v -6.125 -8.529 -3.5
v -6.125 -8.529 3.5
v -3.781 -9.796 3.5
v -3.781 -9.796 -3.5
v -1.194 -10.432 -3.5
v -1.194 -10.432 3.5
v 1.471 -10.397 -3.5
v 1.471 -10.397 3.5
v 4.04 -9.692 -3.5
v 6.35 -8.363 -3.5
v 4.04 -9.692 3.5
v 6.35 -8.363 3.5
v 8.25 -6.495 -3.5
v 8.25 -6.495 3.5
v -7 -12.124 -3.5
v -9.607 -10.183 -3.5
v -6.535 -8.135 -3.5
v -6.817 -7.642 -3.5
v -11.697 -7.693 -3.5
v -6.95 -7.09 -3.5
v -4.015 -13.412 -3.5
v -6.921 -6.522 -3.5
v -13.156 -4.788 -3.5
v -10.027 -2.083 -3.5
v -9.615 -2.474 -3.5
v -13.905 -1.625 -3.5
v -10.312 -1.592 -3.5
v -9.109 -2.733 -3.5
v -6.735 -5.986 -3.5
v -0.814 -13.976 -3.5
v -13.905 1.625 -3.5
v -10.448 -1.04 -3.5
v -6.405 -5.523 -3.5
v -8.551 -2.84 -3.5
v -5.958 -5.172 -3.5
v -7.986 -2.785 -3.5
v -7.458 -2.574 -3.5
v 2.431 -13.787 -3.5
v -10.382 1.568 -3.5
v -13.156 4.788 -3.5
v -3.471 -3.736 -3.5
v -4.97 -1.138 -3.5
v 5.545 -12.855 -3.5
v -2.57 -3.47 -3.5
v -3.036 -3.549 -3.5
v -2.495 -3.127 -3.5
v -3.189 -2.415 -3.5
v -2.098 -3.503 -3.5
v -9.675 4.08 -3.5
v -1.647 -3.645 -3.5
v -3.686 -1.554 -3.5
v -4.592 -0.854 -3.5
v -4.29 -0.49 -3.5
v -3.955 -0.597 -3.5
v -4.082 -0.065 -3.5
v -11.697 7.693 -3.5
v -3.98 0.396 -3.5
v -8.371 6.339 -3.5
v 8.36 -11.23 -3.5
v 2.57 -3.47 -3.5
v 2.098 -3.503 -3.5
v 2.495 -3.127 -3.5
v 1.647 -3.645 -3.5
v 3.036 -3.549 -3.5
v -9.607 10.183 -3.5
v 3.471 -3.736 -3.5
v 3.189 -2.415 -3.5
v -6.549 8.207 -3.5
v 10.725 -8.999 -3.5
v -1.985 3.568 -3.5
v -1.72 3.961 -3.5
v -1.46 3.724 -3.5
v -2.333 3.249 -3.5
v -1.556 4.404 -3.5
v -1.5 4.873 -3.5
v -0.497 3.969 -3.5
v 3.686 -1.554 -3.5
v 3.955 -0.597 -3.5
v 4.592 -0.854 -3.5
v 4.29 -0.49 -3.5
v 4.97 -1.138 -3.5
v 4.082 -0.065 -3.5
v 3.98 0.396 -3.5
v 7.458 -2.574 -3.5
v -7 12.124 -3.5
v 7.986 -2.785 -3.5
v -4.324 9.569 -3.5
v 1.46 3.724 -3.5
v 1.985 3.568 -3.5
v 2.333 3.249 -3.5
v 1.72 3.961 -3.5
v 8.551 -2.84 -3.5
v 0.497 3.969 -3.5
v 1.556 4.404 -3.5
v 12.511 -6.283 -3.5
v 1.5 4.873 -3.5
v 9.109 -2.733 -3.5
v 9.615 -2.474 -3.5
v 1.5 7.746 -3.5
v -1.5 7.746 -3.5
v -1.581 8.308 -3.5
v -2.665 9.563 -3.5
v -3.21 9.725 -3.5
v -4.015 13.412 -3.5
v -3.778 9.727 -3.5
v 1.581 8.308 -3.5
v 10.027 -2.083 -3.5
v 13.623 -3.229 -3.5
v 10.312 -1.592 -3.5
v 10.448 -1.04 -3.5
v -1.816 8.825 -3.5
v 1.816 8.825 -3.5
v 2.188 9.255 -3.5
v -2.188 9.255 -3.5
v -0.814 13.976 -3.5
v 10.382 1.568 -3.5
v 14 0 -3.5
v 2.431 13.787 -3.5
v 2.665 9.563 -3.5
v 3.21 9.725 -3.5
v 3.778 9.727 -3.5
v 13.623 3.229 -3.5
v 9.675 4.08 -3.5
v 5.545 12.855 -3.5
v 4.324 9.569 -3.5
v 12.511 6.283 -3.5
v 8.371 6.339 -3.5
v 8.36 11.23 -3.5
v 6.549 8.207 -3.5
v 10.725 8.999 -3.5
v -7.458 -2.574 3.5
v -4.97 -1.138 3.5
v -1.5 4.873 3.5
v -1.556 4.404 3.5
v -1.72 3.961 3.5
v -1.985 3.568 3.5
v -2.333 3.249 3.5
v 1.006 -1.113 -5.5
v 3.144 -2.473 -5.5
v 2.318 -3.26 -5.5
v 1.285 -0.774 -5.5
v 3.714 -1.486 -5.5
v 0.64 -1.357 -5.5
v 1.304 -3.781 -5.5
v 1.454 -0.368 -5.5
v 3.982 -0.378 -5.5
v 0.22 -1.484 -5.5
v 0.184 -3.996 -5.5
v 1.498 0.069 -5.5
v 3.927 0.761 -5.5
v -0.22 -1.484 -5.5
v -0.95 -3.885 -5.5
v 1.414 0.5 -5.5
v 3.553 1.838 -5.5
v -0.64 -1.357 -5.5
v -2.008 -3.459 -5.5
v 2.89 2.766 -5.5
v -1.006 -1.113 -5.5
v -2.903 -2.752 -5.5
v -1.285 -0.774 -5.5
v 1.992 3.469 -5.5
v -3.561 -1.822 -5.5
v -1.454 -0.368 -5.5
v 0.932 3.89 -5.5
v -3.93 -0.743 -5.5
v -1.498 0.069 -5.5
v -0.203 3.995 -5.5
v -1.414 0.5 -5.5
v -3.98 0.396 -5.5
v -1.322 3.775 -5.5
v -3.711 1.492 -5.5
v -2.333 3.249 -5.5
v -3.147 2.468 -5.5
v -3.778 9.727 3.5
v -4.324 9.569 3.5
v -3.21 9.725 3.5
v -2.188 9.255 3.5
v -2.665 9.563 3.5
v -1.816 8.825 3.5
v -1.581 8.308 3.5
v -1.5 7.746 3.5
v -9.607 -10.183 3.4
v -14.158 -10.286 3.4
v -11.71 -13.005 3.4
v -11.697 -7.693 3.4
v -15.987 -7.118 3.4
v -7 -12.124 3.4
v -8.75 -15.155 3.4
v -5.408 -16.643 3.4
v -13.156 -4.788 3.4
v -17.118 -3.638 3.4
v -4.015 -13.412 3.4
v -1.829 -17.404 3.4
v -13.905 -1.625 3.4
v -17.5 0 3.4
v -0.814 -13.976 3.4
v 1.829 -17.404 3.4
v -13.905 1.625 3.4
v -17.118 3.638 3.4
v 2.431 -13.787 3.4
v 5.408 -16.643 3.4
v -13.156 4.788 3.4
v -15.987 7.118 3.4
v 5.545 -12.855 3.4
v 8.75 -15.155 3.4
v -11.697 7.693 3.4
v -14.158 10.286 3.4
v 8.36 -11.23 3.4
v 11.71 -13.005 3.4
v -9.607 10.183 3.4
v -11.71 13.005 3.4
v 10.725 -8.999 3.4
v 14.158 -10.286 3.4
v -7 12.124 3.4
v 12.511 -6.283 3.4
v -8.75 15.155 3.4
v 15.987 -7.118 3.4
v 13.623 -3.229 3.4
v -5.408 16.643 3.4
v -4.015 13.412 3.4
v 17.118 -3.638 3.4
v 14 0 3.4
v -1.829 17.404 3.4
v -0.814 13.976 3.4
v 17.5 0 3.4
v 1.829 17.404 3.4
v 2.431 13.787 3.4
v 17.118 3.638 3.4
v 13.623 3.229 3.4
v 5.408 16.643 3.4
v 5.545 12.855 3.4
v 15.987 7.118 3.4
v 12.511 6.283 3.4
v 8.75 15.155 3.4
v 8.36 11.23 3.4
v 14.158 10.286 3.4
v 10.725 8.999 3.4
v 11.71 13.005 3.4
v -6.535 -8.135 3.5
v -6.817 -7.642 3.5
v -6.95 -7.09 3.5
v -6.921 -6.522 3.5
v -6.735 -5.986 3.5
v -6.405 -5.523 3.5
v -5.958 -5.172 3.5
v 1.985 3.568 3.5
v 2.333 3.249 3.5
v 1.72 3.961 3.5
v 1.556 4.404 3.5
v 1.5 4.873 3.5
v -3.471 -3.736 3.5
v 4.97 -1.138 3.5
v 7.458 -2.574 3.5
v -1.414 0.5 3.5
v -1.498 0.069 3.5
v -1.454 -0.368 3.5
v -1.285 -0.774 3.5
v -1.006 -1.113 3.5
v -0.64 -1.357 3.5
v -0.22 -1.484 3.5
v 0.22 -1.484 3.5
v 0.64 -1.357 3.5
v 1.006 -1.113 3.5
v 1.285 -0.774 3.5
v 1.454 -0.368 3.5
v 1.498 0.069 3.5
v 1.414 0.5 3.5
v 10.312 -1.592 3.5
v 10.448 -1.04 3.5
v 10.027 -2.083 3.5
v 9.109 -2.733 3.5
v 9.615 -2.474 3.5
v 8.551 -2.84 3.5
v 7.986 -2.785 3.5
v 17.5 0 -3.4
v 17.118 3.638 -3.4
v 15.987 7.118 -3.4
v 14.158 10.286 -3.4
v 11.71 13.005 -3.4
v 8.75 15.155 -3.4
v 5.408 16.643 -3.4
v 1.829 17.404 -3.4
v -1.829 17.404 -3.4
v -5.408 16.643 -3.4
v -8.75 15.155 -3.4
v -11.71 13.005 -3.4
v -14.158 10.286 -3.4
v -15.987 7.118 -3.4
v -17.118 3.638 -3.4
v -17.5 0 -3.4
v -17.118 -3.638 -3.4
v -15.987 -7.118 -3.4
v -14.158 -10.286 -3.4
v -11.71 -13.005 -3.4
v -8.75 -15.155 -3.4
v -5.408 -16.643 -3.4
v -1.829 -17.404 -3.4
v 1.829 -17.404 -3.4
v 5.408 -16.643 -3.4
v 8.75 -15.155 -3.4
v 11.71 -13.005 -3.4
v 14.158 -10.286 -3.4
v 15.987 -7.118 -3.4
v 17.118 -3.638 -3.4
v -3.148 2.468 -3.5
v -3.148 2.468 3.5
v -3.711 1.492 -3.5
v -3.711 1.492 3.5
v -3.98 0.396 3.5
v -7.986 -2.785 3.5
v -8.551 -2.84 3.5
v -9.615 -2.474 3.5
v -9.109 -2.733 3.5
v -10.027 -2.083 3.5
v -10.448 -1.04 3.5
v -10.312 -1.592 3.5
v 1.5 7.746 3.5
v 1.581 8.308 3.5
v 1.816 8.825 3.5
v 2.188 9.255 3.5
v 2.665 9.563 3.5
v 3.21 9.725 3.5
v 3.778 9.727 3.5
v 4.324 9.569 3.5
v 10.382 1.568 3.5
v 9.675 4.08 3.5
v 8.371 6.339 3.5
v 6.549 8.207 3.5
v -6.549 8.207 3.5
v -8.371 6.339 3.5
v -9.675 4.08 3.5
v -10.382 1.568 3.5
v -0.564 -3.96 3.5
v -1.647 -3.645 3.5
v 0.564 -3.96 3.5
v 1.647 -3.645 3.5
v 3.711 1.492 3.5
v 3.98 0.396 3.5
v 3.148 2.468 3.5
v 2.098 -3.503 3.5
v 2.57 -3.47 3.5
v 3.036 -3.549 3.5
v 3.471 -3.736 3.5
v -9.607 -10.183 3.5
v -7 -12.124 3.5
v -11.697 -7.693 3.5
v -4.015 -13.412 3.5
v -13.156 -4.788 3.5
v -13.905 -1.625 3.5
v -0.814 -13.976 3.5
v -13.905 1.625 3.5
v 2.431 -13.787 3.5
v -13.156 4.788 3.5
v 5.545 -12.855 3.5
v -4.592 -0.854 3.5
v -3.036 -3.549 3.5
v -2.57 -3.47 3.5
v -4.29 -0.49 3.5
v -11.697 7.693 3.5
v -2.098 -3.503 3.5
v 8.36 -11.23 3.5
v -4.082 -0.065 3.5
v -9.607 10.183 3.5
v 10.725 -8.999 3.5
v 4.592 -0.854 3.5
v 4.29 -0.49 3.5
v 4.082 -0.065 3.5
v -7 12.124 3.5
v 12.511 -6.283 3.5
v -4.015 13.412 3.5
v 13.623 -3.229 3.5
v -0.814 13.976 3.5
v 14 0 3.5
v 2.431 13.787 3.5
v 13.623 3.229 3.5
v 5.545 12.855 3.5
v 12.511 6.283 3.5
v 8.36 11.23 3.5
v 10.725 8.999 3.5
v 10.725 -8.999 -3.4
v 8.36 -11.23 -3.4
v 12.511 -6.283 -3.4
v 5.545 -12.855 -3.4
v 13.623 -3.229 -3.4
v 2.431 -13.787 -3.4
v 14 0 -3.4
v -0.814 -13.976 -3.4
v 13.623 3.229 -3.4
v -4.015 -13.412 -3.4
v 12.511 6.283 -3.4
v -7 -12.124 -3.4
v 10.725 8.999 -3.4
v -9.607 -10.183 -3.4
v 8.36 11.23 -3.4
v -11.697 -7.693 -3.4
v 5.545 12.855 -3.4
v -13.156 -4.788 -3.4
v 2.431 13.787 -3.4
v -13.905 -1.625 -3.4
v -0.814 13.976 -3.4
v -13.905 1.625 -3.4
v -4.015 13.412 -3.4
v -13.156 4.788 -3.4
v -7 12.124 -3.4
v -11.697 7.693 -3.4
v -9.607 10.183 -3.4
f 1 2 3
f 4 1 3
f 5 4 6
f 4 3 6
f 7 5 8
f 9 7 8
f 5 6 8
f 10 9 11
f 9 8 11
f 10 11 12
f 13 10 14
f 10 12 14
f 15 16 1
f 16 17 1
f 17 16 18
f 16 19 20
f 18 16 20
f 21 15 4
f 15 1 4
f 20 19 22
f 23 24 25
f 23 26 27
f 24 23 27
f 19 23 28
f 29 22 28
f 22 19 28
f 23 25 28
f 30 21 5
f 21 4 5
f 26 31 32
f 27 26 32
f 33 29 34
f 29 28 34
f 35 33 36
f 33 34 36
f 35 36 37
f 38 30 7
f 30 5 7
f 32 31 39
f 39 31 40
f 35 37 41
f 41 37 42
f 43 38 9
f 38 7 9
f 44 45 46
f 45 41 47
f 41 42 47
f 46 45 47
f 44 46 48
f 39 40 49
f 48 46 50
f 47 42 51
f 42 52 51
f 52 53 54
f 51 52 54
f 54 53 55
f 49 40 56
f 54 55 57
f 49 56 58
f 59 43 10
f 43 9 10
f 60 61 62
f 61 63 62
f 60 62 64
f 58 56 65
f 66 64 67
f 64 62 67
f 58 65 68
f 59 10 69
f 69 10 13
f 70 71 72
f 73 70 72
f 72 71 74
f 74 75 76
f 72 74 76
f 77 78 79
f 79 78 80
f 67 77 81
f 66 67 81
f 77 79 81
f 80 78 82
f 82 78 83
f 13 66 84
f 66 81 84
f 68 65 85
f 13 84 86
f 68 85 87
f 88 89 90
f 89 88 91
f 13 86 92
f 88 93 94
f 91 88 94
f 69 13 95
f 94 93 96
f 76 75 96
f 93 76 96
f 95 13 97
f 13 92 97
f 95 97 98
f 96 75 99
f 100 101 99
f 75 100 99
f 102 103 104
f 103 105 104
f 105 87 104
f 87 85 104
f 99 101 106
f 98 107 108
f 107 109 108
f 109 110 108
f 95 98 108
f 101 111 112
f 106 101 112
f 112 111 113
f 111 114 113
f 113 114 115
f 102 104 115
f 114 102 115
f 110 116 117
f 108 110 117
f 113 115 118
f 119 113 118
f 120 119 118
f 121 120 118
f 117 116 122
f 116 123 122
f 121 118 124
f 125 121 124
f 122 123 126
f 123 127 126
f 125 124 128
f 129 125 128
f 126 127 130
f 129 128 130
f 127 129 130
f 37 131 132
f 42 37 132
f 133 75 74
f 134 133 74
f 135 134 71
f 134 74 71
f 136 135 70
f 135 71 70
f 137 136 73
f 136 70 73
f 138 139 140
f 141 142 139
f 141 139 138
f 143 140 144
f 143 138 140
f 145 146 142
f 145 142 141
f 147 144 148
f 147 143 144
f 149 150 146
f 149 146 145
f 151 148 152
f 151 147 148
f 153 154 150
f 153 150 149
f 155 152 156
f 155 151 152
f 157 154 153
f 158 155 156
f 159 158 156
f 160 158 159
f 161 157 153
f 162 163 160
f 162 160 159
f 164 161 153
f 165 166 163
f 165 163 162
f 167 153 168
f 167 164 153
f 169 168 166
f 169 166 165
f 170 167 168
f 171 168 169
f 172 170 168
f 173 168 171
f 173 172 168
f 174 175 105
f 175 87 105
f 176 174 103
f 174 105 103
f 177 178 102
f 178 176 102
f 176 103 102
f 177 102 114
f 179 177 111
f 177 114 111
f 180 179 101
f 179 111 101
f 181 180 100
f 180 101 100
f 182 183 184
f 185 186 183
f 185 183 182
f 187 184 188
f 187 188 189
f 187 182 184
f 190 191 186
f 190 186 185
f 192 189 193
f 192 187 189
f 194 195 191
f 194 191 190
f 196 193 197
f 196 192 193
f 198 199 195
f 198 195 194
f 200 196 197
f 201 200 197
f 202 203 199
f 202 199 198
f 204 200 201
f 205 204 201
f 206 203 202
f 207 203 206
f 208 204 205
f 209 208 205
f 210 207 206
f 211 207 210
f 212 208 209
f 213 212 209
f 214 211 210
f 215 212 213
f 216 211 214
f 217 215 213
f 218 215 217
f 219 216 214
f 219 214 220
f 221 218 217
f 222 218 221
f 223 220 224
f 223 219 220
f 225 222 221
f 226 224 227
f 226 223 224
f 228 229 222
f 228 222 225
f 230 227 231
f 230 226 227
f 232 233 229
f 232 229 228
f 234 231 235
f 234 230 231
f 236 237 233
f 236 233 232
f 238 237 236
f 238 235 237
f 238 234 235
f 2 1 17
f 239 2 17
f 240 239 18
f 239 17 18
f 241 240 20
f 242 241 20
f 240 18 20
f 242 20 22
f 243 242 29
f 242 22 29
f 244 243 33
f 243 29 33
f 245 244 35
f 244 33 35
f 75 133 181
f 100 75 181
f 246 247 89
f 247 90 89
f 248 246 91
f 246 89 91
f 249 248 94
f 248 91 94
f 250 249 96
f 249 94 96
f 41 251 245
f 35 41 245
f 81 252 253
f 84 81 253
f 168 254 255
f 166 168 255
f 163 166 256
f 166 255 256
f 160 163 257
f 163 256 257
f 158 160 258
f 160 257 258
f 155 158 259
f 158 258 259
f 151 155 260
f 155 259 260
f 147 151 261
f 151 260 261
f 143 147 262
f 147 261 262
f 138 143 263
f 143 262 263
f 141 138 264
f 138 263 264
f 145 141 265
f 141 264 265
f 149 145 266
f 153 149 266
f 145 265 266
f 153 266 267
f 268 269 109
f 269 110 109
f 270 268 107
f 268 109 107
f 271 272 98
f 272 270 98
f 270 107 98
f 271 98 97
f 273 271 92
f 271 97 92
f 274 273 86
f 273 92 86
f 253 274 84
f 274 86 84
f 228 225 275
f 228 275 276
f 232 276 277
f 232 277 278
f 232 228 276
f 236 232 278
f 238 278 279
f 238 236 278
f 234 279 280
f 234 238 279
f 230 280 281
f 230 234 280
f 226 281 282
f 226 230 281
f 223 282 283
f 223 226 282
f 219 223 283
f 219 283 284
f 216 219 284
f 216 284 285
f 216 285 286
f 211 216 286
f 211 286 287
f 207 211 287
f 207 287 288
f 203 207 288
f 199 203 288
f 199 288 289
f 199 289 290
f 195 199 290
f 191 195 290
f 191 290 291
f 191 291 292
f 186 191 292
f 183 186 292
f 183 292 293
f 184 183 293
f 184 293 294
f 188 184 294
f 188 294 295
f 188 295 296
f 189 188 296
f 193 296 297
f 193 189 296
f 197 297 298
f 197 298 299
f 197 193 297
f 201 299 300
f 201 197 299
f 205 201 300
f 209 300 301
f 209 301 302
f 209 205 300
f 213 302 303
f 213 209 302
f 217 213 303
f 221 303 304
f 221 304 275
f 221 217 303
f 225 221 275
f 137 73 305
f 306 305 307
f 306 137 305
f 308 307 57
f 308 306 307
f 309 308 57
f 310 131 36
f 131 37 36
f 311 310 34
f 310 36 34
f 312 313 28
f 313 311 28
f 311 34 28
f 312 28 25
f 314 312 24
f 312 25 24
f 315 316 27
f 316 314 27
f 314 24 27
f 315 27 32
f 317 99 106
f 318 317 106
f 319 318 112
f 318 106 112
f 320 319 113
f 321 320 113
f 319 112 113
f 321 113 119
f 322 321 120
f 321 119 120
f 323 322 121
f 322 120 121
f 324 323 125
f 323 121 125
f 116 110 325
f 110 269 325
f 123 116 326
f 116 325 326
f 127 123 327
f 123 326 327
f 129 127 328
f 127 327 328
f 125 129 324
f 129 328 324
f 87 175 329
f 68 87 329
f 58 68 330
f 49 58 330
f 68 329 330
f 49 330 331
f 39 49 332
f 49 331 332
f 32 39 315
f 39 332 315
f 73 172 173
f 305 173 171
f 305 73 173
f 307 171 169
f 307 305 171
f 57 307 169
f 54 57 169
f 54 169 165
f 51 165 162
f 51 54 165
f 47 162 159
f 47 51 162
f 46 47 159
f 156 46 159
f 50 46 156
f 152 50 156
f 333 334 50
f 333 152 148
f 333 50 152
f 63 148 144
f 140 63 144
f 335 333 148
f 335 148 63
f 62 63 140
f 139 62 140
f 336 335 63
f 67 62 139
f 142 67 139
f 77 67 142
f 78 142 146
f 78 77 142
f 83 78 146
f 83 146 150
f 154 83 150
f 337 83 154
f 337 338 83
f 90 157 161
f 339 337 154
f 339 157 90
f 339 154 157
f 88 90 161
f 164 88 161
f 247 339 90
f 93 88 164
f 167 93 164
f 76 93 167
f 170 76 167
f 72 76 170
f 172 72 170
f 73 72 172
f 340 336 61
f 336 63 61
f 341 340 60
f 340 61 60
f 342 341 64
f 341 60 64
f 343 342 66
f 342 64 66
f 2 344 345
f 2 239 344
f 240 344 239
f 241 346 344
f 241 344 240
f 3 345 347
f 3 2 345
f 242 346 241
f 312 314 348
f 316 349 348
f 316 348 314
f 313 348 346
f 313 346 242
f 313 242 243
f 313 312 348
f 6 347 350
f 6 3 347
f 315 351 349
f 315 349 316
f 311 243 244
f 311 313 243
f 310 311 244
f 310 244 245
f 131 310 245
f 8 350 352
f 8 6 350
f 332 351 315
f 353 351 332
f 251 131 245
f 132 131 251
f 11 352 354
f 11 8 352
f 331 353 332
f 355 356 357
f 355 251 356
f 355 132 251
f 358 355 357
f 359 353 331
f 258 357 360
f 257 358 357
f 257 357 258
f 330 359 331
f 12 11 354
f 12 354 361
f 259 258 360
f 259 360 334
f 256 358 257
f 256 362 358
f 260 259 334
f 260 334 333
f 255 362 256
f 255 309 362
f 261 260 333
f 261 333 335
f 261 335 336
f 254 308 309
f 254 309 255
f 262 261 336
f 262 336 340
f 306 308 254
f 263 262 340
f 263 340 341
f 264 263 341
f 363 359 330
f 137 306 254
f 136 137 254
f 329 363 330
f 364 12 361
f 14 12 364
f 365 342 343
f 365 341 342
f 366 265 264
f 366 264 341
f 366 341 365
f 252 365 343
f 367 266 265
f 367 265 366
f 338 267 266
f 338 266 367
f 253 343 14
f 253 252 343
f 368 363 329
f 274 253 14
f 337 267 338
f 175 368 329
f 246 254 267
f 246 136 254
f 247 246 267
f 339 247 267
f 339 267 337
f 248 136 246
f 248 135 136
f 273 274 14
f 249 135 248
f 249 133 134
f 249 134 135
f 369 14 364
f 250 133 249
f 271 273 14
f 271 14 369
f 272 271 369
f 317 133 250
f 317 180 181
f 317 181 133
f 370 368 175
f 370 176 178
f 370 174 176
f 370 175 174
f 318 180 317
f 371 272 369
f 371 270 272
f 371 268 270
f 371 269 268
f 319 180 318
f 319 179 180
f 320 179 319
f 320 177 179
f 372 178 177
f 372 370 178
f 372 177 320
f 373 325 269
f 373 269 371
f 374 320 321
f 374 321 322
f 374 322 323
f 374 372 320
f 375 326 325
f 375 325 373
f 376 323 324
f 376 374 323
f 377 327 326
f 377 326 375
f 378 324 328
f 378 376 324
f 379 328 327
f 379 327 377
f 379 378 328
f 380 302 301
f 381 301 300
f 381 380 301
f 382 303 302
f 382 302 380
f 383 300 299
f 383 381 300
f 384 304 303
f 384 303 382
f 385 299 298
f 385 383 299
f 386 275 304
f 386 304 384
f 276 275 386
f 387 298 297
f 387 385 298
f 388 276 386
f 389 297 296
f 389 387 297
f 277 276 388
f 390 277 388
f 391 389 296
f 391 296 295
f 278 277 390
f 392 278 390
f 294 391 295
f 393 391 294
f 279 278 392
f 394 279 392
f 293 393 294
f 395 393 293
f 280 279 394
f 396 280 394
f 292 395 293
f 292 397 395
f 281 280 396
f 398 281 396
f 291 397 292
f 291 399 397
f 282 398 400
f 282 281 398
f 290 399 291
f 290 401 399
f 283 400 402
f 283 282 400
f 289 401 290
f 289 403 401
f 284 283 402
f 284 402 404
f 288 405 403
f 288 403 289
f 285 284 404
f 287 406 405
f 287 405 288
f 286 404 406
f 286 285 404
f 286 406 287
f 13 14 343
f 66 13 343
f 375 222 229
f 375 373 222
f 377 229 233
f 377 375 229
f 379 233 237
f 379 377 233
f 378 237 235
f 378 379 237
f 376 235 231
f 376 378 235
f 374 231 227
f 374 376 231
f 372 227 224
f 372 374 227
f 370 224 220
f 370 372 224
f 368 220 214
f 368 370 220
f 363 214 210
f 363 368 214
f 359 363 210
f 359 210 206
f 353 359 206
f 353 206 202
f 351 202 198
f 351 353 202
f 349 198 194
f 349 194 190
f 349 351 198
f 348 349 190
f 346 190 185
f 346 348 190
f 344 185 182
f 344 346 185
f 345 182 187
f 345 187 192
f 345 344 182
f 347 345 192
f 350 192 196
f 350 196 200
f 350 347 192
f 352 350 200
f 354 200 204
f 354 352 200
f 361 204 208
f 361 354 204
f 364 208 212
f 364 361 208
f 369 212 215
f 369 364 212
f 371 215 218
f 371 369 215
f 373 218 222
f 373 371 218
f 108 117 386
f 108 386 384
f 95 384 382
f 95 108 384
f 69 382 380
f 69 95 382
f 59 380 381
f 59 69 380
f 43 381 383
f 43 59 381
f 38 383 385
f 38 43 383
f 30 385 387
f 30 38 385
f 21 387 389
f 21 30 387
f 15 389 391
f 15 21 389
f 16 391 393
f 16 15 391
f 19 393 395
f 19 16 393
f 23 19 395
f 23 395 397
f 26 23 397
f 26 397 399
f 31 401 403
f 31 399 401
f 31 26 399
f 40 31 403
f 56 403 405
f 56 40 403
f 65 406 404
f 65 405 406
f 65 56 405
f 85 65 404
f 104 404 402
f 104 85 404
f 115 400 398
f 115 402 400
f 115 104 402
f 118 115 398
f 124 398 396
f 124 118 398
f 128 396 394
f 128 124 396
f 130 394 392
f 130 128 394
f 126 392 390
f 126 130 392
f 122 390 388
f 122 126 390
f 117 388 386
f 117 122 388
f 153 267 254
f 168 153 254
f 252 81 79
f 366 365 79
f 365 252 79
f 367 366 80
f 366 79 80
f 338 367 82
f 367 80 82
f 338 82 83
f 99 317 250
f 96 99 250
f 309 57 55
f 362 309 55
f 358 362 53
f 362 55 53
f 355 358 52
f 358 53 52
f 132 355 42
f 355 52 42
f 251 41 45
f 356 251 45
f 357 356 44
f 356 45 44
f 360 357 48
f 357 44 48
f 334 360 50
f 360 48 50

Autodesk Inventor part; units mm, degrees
ref_plane "YZ Plane" through (0, 0, 0) normal (1, 0, 0) x (0, 1, 0)
ref_plane "XZ Plane" through (0, 0, 0) normal (0, 1, 0) x (-1, 0, 0)
ref_plane "XY Plane" through (0, 0, 0) normal (0, 0, 1) x (1, 0, 0)
sketch "Sketch1" plane through (0, 0, 0) normal (0, 0, 1) x (1, 0, 0)
  circle A0 centre (0, 0) radius 17.5
  dimension "d0" = 35
extrude "Extrusion1" add sketch "Sketch1" along normal mid plane 7
sketch "Sketch2" plane through (0, 0, 3.5) normal (0, 0, 1) x (1, 0, 0)
  circle A0 centre (0, 0) radius 10.5
  circle A1 centre (0, 0) radius 4
  line L0 (1.5, 0) -> (-1.5, 0)
  line L1 (-1.5, 0) -> (-1.5, 10.5)
  line L2 (-1.5, 10.5) -> (1.5, 10.5)
  line L3 (1.5, 10.5) -> (1.5, 0)
  line L4 (0.75, -1.299) -> (-8.3433, -6.549)
  line L5 (-9.8433, -3.951) -> (-0.75, 1.299)
  line L6 (0.75, 1.299) -> (9.8433, -3.951)
  line L7 (8.3433, -6.549) -> (-0.75, -1.299)
  point P0 (0, 10.5)
  point P1 (8.25, -6.4952)
  point P2 (2.4613, -3.1531)
  point P3 (-2.4613, -3.1531)
  point P4 (-8.25, -6.4952)
  point P5 (3.9613, -0.555)
  point P6 (9.75, -3.8971)
  point P7 (1.5, 10.3923)
  point P8 (1.5, 3.7081)
  point P9 (-9.75, -3.8971)
  point P10 (-3.9613, -0.555)
  point P11 (-1.5, 3.7081)
  point P12 (-1.5, 10.3923)
  dimension "d3" = 21
  dimension "d4" = 8
  dimension "d5" = 3
  dimension "d8" = 360
extrude "Extrusion2" cut sketch "Sketch2" against normal through all contours A0 L6 A1 L3 | A0 L4 A1 L7 | L1 A1 L5 A0
fillet "Fillet1" radius 2 11 edges at (1.5, 3.7081, 0) (3.9613, -0.555, 0) (9.75, -3.8971, 0) (-8.25, -6.4952, 0) (-9.75, -3.8971, 0) (-3.9613, -0.555, 0) (-1.5, 3.7081, 0) (1.5, 10.3923, 0) (-1.5, 10.3923, 0) (-2.4613, -3.1531, 0) (2.4613, -3.1531, 0)
sketch "Sketch4" plane through (0, 0, -3.5) normal (0, 0, -1) x (-1, 0, 0)
  circle A0 centre (0, 0) radius 4
  arc A1 (3.9803, 0.3963) -> (2.3333, 3.2489) centre (0, 0) ccw projected
extrude "Extrusion4" add sketch "Sketch4" along normal blind 2
sketch "Sketch3" plane through (0, 0, 3.5) normal (0, 0, 1) x (1, 0, 0)
  circle A0 centre (0, 0) radius 1.5
  line L0 (1.4142, 0.5) -> (-1.4142, 0.5)
  dimension "d17" = 3
  dimension "d19" = 2
extrude "Extrusion3" cut sketch "Sketch3" against normal through all contours A0 L0 picked at (0.0393, -0.1651)
sketch "Sketch5" plane through (0, 0, 3.5) normal (0, 0, 1) x (1, 0, 0)
  circle A0 centre (0, 0) radius 14
  circle A1 centre (0, 0) radius 17.5 projected
  dimension "d22" = 28
extrude "Extrusion5" cut sketch "Sketch5" against normal blind 0.1
mirror "Mirror1" about plane through (0, 0, 0) normal (0, 0, 1) of "Extrusion5"
properties part number "front wheel v2"
